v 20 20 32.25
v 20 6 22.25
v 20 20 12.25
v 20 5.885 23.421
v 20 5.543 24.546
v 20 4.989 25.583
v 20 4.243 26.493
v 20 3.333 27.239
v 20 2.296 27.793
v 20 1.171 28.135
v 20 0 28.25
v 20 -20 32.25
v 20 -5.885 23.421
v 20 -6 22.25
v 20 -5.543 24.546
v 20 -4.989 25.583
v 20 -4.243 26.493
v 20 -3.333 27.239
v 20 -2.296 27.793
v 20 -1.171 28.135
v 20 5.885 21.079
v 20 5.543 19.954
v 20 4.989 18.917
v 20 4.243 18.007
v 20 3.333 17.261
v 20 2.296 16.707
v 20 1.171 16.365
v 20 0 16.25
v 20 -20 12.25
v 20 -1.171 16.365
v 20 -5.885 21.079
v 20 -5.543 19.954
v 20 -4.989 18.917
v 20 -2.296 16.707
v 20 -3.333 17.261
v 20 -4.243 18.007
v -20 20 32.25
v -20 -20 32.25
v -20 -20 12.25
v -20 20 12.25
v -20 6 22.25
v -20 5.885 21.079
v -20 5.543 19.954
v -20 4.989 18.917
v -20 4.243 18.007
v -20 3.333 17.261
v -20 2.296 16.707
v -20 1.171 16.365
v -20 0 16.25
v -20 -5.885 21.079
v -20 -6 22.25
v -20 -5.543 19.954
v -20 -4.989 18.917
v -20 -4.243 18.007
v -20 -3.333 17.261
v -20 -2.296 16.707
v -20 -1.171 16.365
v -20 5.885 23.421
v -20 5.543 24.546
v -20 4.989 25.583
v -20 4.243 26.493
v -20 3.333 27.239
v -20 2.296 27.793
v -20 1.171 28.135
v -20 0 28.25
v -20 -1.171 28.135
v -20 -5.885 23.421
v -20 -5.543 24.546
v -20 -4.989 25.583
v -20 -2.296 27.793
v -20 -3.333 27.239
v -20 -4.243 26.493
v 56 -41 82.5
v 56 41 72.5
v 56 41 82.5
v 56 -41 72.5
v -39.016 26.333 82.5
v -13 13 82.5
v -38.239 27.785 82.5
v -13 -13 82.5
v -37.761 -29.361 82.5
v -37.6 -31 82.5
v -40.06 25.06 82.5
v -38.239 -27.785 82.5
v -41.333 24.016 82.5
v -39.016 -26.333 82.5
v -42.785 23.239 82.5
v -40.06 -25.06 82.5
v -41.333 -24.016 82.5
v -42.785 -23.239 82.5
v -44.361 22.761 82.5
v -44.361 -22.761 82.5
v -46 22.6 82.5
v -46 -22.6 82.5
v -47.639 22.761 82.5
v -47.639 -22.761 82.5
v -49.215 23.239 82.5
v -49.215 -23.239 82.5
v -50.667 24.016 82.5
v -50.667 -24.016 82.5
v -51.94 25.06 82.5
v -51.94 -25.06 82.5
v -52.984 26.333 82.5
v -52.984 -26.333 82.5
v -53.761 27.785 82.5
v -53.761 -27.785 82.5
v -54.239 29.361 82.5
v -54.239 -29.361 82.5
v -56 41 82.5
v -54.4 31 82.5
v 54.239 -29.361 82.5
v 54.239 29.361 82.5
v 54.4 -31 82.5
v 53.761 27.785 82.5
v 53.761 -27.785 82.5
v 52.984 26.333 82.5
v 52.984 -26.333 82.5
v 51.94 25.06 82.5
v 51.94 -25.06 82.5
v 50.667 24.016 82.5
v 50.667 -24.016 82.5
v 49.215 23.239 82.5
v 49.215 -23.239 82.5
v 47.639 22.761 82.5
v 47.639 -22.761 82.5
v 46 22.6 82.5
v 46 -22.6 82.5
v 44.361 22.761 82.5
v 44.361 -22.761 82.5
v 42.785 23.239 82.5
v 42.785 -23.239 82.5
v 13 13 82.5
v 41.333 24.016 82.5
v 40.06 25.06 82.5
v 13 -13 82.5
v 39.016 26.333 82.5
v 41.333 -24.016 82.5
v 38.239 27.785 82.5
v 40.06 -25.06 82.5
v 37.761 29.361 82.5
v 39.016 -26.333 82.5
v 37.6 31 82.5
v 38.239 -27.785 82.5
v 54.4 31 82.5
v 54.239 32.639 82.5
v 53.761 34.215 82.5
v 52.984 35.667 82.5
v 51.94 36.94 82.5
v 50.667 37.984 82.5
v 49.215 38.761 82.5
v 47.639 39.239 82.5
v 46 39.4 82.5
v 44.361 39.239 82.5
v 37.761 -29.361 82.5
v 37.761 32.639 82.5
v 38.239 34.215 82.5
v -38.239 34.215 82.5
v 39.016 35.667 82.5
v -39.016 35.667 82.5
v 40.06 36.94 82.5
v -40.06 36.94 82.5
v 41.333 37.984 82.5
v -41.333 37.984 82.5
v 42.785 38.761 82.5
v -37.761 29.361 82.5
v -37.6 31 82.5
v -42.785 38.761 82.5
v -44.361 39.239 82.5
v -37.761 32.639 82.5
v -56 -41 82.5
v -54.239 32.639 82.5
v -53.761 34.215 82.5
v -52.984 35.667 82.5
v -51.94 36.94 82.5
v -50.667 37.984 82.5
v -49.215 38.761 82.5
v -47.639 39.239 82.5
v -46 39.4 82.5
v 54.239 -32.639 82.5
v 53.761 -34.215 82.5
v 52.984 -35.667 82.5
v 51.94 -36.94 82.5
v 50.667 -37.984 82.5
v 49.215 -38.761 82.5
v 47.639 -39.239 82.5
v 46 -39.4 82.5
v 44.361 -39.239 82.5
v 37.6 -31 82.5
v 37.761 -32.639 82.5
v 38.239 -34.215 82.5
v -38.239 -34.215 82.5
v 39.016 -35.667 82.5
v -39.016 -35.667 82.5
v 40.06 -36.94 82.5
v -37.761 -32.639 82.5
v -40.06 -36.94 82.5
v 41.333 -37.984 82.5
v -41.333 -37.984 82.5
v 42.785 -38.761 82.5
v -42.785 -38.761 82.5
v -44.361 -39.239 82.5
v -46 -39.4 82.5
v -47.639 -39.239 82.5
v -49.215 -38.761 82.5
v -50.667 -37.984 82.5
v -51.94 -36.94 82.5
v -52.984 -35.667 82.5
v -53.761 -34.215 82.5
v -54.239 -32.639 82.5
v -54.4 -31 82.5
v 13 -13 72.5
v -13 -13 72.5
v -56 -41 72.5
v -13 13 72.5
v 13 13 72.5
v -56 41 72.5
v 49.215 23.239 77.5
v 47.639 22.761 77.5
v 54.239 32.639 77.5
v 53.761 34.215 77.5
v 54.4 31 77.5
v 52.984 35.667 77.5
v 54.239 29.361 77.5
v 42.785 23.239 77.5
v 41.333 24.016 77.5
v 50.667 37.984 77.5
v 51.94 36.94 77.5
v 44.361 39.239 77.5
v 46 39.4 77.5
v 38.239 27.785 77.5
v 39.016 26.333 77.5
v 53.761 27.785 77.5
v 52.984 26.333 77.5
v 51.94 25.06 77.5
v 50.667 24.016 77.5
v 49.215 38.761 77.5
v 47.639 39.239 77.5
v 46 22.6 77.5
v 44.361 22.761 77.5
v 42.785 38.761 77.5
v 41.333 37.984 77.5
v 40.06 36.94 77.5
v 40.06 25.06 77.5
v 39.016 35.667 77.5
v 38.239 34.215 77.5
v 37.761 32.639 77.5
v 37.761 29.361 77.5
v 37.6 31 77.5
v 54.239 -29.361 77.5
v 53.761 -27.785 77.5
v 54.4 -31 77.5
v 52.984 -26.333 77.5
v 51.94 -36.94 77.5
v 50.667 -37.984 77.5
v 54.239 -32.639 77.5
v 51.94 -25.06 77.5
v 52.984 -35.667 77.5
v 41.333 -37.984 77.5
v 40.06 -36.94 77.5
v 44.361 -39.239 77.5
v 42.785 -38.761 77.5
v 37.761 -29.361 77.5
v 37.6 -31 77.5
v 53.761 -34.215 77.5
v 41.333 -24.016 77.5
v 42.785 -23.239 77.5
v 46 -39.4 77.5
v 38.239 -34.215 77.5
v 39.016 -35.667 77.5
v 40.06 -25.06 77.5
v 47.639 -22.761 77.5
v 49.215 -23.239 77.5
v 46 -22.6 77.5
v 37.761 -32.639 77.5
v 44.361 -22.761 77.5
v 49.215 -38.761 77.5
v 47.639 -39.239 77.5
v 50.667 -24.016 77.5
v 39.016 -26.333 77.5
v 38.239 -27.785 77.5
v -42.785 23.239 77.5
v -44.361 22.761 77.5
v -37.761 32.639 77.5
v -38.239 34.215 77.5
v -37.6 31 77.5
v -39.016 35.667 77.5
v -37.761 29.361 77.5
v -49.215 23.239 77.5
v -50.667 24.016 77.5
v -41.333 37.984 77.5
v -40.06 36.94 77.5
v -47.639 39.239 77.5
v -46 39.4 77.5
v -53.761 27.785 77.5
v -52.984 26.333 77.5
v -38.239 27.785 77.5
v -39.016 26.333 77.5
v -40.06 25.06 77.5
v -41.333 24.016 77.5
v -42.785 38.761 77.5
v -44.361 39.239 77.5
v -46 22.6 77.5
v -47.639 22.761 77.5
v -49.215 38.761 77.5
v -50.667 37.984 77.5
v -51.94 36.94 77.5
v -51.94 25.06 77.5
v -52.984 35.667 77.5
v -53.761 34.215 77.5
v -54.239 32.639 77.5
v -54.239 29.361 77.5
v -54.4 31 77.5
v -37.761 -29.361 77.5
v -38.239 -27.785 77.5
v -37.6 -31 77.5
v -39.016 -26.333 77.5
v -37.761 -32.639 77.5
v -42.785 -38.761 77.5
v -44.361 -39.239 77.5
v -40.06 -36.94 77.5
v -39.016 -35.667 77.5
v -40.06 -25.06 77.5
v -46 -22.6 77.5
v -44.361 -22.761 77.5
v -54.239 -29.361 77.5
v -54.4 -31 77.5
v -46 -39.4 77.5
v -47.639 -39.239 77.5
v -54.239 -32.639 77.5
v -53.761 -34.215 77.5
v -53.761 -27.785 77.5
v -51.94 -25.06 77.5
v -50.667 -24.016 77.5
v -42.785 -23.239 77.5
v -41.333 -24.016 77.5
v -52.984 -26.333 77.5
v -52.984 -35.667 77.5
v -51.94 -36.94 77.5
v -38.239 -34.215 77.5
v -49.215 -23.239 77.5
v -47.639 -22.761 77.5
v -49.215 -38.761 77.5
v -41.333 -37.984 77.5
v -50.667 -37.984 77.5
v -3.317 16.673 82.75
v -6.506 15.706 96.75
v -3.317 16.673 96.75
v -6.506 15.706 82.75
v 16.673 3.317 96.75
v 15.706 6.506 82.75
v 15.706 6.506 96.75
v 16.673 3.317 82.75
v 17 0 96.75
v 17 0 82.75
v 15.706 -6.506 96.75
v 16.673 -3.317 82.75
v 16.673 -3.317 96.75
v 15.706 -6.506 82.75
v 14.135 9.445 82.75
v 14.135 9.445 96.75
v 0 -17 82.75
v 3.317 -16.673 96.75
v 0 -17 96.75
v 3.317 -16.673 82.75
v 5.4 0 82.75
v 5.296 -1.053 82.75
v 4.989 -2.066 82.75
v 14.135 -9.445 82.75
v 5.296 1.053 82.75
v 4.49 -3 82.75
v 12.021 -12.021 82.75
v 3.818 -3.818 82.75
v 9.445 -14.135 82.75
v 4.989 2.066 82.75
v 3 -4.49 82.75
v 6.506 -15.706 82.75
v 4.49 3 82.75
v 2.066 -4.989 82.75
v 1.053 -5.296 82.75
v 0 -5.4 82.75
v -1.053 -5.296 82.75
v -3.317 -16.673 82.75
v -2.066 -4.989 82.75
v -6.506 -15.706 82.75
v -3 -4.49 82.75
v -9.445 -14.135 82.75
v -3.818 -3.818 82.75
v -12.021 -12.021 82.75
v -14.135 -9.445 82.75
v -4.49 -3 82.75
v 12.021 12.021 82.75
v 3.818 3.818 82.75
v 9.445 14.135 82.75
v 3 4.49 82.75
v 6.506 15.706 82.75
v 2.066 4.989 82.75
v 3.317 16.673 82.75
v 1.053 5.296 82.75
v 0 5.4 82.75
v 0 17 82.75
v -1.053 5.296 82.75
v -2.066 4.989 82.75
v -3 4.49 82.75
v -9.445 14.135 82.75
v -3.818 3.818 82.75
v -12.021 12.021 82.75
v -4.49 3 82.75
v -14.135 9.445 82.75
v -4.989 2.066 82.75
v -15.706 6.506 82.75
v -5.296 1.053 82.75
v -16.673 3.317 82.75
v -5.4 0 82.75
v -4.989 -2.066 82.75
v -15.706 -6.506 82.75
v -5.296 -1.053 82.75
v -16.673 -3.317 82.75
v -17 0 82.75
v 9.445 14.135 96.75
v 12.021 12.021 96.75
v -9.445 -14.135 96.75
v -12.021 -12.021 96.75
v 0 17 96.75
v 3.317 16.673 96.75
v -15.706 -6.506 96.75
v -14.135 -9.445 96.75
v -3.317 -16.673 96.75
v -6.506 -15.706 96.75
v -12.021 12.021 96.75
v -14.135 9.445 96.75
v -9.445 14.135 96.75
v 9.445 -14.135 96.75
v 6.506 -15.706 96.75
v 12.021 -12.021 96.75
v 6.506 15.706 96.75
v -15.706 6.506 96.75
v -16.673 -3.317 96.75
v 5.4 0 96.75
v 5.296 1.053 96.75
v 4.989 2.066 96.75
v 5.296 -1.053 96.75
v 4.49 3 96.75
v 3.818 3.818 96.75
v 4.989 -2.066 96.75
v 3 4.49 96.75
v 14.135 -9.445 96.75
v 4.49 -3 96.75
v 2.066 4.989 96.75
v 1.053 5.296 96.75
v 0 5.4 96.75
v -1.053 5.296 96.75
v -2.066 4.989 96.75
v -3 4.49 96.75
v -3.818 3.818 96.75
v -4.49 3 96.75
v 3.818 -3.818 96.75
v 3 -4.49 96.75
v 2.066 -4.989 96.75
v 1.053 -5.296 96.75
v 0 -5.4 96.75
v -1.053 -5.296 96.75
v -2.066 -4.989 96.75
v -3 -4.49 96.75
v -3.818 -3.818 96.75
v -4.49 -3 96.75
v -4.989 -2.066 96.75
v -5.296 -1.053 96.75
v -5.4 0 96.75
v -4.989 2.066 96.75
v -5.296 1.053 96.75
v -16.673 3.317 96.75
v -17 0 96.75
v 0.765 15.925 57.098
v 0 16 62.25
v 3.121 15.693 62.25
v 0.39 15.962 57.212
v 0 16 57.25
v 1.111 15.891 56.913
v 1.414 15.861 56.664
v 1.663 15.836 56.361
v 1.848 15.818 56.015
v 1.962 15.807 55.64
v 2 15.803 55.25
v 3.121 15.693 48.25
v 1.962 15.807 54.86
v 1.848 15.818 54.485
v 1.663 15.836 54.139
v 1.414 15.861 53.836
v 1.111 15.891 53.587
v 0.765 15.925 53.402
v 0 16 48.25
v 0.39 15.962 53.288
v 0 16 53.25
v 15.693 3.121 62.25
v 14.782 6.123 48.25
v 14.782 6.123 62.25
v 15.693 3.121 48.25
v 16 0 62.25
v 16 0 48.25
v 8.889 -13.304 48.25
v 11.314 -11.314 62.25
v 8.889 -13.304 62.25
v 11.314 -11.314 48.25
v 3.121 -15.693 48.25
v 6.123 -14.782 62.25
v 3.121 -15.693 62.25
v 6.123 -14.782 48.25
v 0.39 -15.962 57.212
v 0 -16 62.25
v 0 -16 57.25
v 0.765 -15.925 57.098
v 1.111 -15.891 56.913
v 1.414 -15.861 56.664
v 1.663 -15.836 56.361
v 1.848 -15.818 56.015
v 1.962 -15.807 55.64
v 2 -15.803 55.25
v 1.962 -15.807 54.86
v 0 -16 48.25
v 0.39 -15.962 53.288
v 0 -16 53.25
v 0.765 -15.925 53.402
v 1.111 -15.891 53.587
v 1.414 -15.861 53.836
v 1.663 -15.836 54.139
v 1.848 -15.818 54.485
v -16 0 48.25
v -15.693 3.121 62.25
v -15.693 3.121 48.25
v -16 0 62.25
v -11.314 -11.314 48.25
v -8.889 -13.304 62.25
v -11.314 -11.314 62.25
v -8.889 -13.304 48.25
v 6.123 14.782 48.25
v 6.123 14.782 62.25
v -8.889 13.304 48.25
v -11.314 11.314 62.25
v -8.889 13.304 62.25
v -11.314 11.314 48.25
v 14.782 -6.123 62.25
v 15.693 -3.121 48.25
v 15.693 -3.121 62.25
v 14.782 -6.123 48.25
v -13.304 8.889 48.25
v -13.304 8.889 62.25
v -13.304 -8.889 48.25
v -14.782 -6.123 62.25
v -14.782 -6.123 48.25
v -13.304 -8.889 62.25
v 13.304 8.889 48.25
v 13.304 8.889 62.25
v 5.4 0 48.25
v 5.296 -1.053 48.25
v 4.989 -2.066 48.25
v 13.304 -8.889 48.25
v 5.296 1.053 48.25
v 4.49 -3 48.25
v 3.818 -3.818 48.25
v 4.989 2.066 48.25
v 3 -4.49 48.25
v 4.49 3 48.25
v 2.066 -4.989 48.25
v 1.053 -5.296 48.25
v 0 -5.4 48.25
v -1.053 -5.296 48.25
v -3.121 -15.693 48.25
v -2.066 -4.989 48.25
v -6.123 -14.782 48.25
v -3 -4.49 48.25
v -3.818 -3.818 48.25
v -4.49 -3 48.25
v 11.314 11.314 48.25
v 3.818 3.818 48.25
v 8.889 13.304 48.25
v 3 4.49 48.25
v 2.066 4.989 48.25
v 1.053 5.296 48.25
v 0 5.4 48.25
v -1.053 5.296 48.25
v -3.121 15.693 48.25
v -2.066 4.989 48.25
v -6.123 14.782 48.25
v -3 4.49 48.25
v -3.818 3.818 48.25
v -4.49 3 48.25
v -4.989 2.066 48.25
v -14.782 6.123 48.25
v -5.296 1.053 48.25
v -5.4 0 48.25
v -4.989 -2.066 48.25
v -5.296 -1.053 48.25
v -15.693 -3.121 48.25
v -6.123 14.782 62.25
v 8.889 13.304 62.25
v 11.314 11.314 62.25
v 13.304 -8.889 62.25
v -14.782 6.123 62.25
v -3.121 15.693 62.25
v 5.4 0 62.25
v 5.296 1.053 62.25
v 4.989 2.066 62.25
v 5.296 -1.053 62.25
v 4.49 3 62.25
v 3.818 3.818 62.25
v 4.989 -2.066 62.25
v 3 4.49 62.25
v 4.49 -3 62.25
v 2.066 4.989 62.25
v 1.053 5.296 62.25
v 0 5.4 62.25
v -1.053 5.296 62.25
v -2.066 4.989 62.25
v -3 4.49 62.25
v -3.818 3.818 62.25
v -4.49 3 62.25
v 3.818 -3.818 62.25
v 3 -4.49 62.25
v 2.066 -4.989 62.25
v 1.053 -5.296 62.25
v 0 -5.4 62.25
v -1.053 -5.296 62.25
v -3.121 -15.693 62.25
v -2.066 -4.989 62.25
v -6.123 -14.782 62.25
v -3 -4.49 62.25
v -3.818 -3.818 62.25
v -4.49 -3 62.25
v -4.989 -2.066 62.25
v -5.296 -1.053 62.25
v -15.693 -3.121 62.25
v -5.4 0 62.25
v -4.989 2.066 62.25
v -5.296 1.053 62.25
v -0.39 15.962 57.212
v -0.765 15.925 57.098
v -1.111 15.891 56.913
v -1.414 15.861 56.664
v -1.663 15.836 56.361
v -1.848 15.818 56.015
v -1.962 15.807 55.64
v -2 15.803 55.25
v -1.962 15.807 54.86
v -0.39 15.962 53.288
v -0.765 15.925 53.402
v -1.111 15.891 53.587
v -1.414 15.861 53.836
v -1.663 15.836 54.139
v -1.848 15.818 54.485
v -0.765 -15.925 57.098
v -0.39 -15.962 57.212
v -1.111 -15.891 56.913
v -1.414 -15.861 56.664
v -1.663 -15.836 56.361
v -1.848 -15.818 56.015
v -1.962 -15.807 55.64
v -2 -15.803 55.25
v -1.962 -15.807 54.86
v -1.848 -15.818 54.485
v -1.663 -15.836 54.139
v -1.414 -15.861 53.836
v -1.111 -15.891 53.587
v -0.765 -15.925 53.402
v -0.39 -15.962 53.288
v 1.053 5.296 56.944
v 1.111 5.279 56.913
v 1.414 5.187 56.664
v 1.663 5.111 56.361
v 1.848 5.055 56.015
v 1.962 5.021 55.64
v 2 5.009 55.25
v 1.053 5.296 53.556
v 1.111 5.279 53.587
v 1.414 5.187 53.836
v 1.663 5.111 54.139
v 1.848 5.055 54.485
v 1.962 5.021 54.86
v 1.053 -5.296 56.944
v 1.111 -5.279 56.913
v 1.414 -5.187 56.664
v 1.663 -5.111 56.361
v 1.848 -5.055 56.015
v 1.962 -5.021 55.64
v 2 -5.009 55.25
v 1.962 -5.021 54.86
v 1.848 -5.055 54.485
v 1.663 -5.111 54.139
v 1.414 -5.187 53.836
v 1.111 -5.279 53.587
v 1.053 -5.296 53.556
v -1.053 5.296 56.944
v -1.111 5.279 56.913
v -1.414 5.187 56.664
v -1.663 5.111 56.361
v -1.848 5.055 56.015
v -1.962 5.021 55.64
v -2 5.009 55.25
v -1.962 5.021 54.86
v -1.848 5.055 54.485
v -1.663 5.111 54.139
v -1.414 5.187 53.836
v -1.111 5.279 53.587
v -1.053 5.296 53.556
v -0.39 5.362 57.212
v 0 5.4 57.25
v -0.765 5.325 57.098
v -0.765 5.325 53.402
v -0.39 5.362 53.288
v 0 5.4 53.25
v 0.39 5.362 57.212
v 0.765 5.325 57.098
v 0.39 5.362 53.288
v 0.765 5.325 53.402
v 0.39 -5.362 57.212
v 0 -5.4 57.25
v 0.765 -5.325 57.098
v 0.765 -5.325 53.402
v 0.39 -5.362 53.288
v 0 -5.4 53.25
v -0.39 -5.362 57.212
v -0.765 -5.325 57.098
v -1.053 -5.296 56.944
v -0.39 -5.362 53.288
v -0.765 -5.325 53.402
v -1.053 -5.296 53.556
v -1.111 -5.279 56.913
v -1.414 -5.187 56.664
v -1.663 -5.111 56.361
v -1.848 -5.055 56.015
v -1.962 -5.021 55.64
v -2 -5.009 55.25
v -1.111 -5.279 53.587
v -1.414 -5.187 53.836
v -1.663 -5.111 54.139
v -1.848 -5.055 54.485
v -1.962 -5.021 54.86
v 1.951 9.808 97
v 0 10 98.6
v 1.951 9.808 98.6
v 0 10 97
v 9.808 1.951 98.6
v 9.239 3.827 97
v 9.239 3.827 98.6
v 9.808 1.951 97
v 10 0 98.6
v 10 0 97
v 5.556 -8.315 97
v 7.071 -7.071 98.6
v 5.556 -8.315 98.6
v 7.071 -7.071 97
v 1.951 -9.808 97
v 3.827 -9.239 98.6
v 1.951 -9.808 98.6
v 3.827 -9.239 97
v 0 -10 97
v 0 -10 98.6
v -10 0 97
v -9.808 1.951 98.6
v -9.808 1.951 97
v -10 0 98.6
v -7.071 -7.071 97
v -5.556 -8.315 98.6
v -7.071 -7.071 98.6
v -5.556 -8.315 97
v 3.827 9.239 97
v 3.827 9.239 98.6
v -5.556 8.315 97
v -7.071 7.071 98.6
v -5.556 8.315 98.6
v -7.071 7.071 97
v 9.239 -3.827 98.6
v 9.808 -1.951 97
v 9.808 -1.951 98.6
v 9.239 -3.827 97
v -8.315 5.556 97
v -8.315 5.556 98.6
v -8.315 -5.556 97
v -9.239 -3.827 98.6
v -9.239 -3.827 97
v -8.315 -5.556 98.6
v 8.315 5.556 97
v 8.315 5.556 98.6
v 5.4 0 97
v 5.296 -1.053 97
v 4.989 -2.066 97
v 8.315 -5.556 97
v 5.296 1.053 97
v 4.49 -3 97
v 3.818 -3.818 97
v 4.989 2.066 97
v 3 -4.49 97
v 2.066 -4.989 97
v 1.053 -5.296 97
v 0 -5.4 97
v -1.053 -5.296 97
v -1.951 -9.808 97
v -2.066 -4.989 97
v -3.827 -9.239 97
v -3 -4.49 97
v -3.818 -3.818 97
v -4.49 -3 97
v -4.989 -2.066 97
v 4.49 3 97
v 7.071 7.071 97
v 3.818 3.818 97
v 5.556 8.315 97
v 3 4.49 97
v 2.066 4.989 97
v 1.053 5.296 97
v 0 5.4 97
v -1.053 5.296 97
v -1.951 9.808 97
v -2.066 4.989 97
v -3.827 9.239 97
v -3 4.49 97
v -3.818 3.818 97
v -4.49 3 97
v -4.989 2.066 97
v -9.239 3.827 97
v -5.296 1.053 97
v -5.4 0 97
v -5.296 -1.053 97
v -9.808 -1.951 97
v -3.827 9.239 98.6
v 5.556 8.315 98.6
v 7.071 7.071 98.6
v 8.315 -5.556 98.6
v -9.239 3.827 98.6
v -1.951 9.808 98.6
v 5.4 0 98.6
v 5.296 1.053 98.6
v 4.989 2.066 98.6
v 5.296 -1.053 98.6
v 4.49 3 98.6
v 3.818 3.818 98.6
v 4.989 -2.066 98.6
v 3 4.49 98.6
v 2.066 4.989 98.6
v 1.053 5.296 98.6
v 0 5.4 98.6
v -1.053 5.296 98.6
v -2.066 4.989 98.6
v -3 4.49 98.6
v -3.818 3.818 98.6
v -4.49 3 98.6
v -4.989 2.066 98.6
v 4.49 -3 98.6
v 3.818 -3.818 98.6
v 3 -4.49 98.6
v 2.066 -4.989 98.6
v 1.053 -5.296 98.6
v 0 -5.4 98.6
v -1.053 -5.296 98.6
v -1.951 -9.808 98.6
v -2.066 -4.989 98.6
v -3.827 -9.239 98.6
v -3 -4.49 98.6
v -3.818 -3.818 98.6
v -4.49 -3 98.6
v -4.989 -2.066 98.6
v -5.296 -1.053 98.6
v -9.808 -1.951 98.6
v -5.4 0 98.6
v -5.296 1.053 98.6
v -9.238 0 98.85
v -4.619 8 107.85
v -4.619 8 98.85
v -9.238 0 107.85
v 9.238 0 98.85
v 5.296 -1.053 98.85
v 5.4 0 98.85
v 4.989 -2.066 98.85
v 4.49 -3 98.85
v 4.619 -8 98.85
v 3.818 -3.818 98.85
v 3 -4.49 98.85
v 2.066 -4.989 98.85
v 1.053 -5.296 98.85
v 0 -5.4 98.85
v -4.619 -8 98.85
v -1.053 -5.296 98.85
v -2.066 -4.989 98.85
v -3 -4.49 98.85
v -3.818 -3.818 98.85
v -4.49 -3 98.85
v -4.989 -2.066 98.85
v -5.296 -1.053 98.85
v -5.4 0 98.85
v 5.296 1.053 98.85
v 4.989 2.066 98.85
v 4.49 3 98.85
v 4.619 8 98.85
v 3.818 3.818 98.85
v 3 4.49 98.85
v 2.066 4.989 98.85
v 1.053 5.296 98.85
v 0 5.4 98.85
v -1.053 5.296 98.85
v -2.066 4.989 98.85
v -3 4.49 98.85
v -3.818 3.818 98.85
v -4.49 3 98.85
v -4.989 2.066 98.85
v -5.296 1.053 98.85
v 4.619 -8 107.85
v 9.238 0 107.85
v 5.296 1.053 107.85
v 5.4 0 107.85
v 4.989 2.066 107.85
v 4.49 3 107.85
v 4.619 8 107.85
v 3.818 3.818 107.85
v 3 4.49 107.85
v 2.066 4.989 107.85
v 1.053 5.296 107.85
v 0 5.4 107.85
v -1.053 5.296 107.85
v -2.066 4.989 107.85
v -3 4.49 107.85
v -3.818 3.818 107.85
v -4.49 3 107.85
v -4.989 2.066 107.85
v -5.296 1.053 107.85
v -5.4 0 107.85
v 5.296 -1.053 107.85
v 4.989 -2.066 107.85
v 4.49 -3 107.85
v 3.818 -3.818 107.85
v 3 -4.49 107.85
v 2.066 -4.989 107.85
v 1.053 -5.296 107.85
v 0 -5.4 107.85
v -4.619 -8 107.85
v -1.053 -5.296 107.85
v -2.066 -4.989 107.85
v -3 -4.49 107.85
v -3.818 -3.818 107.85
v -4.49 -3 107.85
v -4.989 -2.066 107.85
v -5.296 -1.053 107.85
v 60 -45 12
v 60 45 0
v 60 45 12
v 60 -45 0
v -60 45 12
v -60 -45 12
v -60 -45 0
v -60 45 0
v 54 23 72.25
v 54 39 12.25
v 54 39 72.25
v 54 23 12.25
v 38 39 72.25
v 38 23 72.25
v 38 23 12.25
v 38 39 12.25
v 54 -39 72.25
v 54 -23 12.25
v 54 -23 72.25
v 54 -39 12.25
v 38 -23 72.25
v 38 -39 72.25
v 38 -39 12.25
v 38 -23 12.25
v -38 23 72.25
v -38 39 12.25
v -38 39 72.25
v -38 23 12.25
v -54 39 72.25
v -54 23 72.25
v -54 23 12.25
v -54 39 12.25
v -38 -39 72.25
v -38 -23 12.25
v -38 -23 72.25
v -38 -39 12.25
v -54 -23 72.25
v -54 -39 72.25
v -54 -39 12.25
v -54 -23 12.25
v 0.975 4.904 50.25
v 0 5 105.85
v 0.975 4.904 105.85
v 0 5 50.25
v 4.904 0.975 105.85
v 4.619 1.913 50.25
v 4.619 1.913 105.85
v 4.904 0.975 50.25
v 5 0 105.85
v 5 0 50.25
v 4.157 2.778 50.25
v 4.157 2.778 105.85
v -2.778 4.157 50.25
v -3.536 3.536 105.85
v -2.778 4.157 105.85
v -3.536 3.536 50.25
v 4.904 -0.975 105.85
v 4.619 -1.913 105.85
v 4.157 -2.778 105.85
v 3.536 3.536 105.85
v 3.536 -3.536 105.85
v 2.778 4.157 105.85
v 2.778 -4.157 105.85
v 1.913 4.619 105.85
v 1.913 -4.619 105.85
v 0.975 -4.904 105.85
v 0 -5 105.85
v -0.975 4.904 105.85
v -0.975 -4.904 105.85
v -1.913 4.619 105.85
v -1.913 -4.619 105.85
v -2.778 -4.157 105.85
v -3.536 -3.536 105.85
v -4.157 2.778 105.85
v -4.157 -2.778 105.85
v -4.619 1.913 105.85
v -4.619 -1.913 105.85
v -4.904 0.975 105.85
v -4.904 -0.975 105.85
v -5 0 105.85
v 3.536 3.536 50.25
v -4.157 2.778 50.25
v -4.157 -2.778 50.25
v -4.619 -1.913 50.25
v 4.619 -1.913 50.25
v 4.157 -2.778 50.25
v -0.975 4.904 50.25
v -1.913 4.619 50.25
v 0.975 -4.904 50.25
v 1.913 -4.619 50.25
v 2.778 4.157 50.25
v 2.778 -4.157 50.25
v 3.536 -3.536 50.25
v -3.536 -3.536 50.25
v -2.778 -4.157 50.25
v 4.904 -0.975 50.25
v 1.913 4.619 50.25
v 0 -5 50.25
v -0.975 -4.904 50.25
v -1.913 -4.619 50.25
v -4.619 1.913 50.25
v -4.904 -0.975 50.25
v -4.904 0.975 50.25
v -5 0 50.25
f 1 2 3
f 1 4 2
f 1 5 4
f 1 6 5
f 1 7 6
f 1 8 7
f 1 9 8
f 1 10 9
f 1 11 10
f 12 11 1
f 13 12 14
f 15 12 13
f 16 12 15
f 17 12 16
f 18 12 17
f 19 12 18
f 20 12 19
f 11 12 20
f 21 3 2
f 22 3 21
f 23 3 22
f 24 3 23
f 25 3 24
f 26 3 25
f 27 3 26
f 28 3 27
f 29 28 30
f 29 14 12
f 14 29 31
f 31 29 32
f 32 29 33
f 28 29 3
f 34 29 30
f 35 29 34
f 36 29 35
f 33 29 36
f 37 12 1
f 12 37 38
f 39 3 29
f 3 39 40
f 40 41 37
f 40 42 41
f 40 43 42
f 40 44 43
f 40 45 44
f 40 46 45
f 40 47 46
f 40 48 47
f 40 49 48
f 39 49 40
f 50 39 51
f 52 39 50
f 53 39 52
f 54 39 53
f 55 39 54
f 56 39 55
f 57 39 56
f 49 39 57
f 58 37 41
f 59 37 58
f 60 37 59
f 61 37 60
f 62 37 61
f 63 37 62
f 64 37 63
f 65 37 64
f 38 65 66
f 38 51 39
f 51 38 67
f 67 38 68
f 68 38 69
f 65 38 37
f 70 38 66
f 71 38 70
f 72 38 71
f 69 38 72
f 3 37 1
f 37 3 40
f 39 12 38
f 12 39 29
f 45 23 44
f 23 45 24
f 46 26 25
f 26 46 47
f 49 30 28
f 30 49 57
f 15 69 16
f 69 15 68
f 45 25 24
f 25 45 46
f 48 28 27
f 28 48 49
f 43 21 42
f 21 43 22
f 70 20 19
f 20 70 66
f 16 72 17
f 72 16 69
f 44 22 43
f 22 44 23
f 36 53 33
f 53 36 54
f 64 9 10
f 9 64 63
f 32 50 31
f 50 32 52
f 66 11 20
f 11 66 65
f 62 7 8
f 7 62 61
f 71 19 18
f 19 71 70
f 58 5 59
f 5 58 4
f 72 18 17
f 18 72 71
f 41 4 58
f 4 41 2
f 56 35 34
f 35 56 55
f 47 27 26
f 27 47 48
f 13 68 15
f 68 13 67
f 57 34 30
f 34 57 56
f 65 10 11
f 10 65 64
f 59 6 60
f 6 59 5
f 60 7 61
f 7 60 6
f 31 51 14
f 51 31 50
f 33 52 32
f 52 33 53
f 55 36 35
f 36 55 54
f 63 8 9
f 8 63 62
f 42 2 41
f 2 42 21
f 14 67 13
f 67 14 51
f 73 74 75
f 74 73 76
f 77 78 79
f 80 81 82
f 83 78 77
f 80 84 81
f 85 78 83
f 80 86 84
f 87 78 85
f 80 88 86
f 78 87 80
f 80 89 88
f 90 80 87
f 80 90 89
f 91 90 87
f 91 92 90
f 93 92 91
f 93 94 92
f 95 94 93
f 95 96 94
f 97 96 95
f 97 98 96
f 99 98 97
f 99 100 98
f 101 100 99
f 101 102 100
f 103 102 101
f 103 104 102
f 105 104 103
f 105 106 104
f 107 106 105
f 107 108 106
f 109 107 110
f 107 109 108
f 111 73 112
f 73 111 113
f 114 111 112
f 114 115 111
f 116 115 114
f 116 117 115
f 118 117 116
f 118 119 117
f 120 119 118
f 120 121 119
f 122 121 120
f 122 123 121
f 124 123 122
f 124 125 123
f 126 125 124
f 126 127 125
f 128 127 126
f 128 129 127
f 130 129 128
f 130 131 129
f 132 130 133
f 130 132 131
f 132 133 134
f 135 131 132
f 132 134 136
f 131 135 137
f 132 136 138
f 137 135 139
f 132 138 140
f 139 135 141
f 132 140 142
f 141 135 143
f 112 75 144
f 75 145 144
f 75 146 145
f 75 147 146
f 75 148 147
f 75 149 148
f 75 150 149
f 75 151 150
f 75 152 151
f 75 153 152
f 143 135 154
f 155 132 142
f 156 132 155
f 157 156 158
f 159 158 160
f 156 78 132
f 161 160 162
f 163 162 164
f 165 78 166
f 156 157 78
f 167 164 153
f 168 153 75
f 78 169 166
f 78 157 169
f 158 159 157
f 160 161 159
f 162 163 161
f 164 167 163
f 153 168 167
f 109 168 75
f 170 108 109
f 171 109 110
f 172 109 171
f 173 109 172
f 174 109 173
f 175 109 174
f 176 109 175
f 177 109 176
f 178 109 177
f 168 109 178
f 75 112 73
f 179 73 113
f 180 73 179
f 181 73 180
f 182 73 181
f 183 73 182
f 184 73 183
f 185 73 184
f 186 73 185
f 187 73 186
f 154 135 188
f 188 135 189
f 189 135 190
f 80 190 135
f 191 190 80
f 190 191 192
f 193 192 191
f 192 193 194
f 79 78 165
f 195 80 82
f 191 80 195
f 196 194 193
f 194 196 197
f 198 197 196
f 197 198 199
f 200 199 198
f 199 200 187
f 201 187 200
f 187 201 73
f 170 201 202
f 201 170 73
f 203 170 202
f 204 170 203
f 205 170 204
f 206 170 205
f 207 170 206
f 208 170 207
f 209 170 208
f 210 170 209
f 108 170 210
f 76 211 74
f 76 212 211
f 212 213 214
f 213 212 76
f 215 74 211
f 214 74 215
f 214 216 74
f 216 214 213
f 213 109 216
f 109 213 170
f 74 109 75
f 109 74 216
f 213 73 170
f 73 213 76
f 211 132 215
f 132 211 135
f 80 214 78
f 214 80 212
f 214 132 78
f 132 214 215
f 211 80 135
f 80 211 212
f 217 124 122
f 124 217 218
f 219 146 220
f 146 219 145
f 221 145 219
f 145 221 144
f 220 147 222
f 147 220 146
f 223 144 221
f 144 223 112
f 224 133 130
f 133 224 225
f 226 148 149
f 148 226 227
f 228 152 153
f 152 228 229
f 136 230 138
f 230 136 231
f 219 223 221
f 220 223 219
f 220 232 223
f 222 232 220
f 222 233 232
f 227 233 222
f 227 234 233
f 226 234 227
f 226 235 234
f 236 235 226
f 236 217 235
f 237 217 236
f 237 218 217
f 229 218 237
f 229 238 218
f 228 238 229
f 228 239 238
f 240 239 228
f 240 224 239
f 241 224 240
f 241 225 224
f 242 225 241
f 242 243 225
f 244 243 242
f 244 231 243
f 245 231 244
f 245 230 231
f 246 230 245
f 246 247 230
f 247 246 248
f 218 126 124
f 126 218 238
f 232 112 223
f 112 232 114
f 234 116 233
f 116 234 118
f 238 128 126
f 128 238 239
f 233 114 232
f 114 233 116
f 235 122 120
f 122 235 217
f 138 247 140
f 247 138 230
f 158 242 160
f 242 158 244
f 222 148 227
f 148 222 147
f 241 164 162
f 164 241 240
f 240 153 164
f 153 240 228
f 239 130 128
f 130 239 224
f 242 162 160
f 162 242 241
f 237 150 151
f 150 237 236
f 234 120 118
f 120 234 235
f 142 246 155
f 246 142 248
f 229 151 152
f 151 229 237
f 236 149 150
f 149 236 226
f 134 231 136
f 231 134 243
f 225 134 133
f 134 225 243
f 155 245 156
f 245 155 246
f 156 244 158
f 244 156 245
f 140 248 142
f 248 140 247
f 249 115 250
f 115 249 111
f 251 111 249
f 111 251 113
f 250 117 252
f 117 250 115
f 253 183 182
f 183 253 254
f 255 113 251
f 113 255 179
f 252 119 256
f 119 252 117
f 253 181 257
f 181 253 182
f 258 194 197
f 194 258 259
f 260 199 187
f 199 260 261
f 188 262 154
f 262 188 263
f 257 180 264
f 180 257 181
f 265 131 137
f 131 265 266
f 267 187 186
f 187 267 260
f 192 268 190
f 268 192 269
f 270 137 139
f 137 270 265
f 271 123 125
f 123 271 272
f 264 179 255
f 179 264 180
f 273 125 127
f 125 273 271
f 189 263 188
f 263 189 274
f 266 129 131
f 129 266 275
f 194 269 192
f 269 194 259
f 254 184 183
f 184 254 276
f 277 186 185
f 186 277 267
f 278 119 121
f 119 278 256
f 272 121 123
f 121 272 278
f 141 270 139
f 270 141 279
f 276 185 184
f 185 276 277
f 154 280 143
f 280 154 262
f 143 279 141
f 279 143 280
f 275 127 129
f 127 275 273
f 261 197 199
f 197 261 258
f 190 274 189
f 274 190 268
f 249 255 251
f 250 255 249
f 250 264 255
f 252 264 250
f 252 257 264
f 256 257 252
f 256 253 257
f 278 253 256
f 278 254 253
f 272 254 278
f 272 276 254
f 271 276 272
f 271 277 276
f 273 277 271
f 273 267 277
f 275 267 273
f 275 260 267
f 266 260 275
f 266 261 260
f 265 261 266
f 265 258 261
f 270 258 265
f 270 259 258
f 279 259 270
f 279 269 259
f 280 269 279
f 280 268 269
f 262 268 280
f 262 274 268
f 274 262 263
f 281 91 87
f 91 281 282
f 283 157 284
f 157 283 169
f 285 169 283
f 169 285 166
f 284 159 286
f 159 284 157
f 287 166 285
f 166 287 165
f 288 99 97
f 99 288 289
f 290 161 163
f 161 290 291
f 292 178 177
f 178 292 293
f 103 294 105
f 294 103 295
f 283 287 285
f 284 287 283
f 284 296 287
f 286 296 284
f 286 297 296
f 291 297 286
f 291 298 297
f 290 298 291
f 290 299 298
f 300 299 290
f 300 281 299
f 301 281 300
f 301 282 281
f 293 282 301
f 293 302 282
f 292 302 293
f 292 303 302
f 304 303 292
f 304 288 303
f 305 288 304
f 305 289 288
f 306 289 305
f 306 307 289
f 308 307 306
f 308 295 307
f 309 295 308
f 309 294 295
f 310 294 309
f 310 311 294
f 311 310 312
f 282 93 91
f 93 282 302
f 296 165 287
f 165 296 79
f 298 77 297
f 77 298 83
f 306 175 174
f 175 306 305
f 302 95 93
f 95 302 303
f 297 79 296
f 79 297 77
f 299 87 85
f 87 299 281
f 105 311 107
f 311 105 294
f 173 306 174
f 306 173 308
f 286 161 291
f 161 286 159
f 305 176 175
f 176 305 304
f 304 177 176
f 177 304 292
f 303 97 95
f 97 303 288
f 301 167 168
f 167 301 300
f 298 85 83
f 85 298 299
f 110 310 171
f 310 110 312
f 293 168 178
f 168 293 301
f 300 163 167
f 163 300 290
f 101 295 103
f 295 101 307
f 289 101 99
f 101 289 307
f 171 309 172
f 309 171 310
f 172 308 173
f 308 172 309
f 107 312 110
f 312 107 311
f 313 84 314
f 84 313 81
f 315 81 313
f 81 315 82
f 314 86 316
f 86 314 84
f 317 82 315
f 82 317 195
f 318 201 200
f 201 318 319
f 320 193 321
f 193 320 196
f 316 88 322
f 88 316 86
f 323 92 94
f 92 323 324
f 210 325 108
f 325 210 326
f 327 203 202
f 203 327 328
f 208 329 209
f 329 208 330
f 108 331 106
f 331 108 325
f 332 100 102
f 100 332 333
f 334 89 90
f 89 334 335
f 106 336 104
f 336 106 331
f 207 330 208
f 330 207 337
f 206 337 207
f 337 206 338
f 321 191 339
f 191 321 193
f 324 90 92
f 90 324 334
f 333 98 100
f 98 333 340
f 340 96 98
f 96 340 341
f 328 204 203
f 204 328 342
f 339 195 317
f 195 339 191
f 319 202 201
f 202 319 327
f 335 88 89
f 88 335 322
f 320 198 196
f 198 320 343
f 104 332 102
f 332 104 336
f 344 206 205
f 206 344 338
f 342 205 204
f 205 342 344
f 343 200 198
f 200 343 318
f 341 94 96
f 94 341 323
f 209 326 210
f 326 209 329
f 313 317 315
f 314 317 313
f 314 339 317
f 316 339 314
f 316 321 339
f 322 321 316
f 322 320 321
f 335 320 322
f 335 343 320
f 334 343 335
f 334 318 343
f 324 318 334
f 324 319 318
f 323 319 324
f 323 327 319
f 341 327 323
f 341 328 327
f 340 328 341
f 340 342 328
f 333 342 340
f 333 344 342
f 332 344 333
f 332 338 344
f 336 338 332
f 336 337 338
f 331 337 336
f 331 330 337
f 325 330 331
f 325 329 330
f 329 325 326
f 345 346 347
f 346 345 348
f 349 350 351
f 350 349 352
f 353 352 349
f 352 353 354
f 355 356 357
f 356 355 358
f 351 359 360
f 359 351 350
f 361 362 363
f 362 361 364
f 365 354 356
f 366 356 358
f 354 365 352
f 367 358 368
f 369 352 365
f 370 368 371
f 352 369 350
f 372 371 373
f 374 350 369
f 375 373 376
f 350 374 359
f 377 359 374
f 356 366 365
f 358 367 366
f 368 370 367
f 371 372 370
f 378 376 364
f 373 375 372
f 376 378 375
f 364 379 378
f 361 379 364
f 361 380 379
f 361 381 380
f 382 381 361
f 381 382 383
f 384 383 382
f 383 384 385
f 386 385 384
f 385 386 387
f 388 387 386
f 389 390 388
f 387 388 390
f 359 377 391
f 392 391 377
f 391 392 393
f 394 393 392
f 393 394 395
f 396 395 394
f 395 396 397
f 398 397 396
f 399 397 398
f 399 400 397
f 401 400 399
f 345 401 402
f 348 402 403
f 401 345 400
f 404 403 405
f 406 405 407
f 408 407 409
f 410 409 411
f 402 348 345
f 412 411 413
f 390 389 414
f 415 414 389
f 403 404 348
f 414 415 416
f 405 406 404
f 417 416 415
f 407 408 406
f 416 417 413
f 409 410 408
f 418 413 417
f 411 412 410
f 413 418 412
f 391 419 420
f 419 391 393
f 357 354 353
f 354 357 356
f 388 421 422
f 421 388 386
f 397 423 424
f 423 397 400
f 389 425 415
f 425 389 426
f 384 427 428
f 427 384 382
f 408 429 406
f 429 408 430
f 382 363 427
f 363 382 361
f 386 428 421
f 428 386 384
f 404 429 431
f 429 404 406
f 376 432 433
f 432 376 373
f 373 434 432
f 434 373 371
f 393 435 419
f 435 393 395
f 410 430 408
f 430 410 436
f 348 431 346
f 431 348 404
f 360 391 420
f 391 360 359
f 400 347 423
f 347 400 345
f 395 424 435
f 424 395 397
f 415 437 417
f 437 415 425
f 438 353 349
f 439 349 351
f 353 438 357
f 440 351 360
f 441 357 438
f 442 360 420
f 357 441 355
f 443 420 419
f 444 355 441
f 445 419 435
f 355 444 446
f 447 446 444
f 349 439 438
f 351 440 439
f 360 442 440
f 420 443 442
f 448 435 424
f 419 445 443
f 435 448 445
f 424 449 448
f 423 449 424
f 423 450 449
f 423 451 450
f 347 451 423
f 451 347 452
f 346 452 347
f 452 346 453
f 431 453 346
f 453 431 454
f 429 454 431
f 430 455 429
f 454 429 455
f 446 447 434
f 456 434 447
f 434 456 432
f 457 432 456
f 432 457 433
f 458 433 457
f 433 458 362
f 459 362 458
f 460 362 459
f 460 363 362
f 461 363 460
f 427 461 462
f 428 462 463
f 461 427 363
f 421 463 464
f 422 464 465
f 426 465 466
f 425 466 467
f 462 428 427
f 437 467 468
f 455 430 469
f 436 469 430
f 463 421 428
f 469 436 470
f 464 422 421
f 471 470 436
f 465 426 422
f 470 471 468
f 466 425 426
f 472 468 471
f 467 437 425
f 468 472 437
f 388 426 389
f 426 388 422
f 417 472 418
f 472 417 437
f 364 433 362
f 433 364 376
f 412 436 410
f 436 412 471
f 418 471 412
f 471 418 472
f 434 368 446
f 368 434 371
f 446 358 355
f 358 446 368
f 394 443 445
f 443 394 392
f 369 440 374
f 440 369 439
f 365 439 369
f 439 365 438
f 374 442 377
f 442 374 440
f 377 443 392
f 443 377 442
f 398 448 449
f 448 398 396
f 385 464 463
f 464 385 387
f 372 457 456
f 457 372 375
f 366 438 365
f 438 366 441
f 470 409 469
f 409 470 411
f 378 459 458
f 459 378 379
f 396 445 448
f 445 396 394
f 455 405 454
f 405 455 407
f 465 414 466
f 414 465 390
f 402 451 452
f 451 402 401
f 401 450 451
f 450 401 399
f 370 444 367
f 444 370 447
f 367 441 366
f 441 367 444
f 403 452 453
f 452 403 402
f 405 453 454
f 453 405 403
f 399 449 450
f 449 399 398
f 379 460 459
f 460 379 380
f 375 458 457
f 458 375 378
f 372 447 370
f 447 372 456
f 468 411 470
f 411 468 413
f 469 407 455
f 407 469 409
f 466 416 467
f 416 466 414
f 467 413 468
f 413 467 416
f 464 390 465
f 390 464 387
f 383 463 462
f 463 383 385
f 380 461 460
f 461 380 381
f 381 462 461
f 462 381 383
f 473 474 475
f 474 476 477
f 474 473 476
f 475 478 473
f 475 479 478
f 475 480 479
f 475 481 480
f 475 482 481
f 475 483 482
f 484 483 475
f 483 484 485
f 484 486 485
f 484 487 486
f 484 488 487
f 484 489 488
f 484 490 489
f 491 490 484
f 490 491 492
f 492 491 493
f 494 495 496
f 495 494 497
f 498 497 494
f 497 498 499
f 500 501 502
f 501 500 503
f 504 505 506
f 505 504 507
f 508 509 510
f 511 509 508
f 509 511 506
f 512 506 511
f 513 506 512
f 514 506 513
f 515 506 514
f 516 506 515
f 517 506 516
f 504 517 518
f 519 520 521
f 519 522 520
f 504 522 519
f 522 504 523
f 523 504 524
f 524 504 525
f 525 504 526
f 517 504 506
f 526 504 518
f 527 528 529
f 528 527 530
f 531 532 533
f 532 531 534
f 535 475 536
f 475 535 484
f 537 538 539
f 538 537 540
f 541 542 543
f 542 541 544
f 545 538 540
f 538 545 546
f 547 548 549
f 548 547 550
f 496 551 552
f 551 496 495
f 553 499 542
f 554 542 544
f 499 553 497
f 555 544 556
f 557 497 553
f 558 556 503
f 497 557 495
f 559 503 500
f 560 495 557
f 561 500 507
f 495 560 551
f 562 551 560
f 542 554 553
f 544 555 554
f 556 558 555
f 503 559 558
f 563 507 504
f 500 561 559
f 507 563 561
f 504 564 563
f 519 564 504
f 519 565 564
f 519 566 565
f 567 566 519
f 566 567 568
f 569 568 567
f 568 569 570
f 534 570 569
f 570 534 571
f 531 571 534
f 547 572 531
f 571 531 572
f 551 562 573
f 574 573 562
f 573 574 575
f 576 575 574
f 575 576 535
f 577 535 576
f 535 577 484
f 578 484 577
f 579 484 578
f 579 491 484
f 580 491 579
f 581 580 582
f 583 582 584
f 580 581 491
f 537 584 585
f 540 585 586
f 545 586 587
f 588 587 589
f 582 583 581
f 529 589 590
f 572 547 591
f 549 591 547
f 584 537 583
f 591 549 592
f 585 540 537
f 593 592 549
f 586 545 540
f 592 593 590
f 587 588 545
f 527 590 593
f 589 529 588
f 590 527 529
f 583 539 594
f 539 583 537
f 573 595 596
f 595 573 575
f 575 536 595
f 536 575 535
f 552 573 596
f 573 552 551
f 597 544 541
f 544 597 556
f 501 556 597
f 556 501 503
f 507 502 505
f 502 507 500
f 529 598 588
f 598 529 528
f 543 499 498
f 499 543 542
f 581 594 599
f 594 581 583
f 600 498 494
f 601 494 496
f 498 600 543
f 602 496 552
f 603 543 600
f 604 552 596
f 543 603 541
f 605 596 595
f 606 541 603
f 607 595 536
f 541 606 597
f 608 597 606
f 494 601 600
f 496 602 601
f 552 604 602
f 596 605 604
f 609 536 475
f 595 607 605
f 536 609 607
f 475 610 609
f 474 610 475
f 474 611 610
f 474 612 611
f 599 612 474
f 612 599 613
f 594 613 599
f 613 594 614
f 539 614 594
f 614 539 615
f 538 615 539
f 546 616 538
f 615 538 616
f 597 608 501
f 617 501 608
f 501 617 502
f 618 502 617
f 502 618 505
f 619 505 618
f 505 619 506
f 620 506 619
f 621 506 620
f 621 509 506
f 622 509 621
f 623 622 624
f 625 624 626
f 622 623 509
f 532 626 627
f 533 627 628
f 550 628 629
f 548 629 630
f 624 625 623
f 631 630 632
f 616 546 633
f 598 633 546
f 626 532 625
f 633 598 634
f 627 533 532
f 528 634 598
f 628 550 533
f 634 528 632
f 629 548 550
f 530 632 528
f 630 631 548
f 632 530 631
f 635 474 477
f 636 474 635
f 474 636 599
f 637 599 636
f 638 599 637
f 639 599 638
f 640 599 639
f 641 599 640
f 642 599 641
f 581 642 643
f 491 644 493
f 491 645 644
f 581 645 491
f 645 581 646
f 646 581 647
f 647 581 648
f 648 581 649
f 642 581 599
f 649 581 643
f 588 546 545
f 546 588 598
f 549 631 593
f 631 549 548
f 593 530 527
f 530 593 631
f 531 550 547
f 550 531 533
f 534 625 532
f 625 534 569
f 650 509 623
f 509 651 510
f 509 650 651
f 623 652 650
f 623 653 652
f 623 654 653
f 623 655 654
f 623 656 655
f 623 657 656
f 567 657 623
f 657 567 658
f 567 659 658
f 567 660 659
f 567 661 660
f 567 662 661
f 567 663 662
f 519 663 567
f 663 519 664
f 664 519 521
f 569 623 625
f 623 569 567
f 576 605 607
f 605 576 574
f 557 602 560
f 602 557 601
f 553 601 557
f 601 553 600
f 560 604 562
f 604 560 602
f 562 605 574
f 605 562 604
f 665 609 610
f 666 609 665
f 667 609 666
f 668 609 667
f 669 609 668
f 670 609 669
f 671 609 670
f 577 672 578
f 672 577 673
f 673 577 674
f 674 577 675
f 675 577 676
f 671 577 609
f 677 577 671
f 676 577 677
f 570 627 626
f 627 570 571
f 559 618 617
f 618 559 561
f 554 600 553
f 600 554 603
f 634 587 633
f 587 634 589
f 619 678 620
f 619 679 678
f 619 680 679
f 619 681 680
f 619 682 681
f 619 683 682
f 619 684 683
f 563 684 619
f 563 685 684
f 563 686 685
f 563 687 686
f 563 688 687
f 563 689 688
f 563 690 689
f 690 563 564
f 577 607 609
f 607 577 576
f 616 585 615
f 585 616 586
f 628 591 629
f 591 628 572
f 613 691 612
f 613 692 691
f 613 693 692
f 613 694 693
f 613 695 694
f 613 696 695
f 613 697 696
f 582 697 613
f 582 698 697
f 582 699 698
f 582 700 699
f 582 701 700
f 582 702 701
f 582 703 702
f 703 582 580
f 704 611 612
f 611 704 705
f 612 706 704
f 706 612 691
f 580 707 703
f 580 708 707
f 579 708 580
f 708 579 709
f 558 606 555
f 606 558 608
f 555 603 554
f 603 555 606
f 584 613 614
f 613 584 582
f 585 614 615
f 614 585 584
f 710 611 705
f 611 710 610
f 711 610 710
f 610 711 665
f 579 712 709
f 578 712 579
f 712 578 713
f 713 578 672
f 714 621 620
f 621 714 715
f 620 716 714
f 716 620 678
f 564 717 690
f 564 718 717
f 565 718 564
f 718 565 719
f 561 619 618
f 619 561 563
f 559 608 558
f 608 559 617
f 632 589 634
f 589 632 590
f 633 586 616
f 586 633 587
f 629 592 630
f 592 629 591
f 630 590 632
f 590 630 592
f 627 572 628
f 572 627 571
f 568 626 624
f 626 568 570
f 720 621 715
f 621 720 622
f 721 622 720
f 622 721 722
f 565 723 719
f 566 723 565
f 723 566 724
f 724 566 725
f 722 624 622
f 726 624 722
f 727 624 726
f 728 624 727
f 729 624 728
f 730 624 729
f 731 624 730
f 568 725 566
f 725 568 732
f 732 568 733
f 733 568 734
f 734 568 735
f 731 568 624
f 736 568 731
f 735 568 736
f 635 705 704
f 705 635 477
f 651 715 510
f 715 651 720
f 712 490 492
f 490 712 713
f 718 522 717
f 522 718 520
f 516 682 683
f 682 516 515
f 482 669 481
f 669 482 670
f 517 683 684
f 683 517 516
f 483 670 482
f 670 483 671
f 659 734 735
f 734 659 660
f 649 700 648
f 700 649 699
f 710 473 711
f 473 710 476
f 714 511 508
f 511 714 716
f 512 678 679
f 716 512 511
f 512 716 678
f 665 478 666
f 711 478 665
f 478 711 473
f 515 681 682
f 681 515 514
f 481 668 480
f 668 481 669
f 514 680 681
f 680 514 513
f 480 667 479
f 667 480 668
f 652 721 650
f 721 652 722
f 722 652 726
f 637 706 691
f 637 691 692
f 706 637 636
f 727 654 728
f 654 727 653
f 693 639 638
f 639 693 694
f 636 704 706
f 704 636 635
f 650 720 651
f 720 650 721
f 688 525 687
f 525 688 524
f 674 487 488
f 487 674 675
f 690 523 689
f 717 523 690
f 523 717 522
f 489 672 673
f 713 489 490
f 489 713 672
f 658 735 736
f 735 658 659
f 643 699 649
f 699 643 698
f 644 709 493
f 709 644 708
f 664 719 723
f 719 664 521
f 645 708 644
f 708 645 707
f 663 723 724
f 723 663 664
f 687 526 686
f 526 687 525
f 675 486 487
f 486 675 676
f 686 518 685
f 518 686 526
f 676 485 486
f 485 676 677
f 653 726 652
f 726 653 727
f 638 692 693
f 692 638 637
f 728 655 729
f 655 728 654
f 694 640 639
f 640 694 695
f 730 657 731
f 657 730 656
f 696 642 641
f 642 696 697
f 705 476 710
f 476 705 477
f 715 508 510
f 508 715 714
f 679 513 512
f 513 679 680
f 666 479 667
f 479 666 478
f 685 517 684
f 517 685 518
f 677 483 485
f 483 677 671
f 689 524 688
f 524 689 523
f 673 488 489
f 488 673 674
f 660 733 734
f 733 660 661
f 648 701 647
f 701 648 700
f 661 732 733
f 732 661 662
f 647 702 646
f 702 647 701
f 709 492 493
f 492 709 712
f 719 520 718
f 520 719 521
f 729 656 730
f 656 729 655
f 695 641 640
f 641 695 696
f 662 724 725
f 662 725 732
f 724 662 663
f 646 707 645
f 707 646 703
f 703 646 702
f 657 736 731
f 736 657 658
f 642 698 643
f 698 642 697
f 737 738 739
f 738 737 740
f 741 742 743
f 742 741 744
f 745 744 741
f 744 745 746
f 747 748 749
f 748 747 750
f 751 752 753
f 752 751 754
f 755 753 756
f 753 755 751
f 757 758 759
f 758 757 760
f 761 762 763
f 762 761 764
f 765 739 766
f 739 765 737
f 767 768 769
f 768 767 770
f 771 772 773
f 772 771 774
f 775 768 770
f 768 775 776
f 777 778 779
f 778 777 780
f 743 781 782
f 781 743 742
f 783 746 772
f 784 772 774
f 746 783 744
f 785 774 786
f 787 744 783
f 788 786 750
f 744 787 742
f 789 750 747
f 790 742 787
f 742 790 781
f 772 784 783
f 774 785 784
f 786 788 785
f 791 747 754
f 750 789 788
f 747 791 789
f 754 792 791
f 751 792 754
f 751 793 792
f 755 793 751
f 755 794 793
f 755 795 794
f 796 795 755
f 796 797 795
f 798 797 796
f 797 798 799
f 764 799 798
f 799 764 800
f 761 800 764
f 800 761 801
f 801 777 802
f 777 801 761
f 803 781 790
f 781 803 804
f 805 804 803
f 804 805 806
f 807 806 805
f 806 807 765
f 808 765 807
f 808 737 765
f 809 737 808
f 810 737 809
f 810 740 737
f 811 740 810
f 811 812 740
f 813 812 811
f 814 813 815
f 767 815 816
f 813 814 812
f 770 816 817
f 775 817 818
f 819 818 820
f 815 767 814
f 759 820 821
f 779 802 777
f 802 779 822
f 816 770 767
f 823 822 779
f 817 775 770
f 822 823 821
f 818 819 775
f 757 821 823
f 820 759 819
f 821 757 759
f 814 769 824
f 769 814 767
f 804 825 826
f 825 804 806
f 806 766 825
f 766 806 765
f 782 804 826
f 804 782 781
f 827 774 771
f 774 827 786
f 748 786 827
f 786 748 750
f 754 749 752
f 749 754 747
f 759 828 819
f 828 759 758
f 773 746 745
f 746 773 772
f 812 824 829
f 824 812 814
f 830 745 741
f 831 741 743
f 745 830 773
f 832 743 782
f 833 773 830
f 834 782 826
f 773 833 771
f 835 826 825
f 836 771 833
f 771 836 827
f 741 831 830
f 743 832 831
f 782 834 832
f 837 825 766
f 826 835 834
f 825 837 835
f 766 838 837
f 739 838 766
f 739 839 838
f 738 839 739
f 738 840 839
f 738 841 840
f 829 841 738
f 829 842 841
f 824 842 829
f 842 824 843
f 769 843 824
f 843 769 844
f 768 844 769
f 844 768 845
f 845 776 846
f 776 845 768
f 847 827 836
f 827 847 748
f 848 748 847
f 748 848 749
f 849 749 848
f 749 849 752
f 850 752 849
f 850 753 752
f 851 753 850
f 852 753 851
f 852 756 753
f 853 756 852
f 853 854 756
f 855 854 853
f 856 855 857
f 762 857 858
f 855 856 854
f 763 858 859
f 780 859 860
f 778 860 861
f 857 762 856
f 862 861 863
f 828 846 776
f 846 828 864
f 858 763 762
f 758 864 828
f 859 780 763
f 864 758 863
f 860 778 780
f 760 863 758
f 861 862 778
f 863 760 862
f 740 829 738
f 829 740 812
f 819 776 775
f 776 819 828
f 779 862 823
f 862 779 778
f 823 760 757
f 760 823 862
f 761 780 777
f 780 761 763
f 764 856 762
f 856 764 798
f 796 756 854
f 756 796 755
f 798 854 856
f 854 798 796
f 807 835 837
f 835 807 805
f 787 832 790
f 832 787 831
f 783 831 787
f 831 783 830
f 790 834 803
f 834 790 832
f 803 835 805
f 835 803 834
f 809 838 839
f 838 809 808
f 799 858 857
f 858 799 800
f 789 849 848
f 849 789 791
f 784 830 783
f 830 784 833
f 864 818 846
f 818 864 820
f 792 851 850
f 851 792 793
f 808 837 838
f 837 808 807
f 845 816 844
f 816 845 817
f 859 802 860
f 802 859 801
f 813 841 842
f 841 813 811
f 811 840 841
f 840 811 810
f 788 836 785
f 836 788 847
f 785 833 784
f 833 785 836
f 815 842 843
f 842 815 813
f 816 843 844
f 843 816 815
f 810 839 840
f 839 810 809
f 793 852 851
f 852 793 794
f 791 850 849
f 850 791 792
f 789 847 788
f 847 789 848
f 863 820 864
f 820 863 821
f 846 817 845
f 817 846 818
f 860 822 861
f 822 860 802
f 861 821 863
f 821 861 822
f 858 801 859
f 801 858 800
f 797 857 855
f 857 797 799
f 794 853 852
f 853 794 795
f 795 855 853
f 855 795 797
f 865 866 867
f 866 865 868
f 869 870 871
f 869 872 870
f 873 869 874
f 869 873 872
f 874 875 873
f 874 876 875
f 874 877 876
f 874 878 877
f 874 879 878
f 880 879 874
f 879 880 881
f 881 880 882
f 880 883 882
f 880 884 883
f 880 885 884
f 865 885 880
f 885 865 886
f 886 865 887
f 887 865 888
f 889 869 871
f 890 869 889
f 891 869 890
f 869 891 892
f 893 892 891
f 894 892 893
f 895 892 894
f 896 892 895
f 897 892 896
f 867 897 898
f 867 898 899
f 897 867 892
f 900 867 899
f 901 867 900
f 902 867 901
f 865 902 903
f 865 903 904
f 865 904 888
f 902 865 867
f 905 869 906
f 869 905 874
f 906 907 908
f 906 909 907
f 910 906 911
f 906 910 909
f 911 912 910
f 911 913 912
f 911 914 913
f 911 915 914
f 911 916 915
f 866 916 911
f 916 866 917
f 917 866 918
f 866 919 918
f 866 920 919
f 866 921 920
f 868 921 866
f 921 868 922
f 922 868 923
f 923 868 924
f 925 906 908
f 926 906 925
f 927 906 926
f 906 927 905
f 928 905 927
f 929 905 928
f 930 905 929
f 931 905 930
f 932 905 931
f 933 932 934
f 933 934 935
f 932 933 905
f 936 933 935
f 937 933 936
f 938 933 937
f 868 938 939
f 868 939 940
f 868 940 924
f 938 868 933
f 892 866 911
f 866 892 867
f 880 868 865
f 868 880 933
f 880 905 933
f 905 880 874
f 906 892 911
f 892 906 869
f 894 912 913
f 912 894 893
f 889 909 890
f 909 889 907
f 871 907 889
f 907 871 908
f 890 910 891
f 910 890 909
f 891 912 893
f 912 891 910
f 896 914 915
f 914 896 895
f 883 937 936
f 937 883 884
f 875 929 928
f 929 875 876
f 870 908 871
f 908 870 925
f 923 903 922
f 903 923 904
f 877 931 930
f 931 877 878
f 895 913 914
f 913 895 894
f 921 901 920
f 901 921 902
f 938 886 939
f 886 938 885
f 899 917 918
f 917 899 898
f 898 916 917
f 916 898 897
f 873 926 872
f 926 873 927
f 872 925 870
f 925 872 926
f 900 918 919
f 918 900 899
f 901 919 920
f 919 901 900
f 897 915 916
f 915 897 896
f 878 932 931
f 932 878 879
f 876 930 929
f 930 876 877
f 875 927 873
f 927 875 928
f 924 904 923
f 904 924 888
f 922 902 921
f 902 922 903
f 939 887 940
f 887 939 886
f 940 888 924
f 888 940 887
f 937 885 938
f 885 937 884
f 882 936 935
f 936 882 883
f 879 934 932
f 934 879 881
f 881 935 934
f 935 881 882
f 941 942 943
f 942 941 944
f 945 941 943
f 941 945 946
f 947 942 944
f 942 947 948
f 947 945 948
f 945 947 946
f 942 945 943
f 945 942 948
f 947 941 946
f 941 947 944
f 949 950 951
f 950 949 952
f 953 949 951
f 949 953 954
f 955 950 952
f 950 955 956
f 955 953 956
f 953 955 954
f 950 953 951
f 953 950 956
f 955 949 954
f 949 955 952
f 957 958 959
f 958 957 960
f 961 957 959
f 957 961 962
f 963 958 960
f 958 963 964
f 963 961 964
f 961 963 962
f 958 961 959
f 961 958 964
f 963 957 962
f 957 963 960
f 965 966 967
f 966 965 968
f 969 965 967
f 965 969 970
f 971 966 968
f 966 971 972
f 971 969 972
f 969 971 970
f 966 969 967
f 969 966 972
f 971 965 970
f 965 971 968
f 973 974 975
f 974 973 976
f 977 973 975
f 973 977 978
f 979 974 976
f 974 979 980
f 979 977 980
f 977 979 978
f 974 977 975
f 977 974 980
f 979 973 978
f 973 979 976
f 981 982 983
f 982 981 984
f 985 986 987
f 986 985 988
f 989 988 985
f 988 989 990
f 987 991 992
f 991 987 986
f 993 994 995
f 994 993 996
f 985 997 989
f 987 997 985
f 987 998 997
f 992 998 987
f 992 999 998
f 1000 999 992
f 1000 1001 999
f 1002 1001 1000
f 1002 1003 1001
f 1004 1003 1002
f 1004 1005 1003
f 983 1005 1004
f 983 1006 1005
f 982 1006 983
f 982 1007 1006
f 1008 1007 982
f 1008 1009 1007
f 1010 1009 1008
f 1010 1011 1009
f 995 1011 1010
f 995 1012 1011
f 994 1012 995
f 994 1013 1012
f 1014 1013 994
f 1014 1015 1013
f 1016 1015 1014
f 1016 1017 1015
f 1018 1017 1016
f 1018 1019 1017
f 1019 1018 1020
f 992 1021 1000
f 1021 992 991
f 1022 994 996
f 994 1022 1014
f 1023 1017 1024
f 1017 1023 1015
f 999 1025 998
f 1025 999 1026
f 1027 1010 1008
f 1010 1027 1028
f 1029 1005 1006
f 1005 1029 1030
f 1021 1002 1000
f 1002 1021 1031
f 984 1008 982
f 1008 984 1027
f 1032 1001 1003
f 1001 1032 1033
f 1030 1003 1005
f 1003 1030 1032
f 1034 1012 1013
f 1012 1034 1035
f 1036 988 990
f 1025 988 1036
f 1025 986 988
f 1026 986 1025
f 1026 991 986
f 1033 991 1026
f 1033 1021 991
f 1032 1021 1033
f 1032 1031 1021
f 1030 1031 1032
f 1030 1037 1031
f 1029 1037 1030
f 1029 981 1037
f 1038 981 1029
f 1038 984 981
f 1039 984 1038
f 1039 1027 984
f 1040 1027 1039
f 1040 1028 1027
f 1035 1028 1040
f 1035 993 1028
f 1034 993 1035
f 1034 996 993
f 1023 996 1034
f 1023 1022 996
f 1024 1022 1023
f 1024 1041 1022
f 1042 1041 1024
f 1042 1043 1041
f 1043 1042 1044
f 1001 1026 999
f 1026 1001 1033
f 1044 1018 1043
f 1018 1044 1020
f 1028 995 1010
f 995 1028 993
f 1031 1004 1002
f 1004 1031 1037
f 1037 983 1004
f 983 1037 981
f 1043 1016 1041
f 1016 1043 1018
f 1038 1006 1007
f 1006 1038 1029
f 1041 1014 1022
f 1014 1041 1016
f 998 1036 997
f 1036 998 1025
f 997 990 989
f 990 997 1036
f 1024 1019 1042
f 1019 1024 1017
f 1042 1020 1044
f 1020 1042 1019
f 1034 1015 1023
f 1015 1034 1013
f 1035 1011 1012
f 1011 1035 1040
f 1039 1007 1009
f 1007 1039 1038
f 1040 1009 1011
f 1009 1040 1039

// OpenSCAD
$fn = 32;

// ------------------------------------------------------------------------
// Arbor press fixture: screw d10, posts 60 mm, gap 16 mm
// Every part is its own module, assembly() places every instance.
// ------------------------------------------------------------------------

// --- part 1 ---
module press_bed() {
  difference() {
    translate([-60, -45, 0]) cube([120, 90, 12]);
  }
}

// --- part 2 ---
module anvil_block() {
  difference() {
    translate([-20, -20, 0]) cube([40, 40, 20]);
    translate([0, 0, 10]) rotate([0, 90, 0]) cylinder(h = 42, d = 12, center = true);
  }
}

// --- part 3 ---
module press_post_a() {
  translate([-8, -8, 0]) cube([16, 16, 60]);
}

// --- part 4 ---
module press_post_b() {
  translate([-8, -8, 0]) cube([16, 16, 60]);
}

// --- part 5 ---
module press_post_c() {
  translate([-8, -8, 0]) cube([16, 16, 60]);
}

// --- part 6 ---
module press_post_d() {
  translate([-8, -8, 0]) cube([16, 16, 60]);
}

// --- part 7 ---
module press_frame() {
  difference() {
    translate([-56, -41, 0]) cube([112, 82, 10]);
    translate([-13, -13, -1]) cube([26, 26, 12]);
    translate([46, 31, 5]) cylinder(h = 6, d = 16.8);
    translate([46, -31, 5]) cylinder(h = 6, d = 16.8);
    translate([-46, 31, 5]) cylinder(h = 6, d = 16.8);
    translate([-46, -31, 5]) cylinder(h = 6, d = 16.8);
  }
}

// --- part 8 ---
module guide_ring() {
  difference() {
      translate([0, 0, 0]) cylinder(h = 14, d = 34);
      translate([0, 0, -1]) cylinder(h = 16, d = 10.8);
    }
}

// --- part 9 ---
module press_screw() {
  translate([0, 0, -27.8]) cylinder(h = 55.6, d = 10);
}

// --- part 10 ---
module press_head() {
  difference() {
    cylinder(h = 14, d = 32);
    translate([0, 0, -1]) cylinder(h = 16, d = 10.8);
    translate([0, 0, 7]) rotate([90, 0, 0]) cylinder(h = 34, d = 4, center = true);
  }
}

// --- part 11 ---
module nut_washer() {
  difference() {
      translate([0, 0, 0]) cylinder(h = 1.6, d = 20);
      translate([0, 0, -1]) cylinder(h = 3.6, d = 10.8);
    }
}

// --- part 12 ---
module press_nut() {
  difference() {
    linear_extrude(height = 9) polygon(points = [[9.238, 0], [4.619, 8], [-4.619, 8], [-9.238, 0], [-4.619, -8], [4.619, -8]]);
    translate([0, 0, -1]) cylinder(h = 11, d = 10.8);
  }
}

// --- assembly ---
module assembly() {
  color([0.80, 0.24, 0.20]) translate([0, 0, 0]) rotate([0, 0, 0]) press_bed();
  color([0.20, 0.45, 0.75]) translate([0, 0, 12.25]) rotate([0, 0, 0]) anvil_block();
  color([0.25, 0.62, 0.32]) translate([46, 31, 12.25]) rotate([0, 0, 0]) press_post_a();
  color([0.92, 0.70, 0.18]) translate([46, -31, 12.25]) rotate([0, 0, 0]) press_post_b();
  color([0.58, 0.35, 0.70]) translate([-46, 31, 12.25]) rotate([0, 0, 0]) press_post_c();
  color([0.16, 0.66, 0.66]) translate([-46, -31, 12.25]) rotate([0, 0, 0]) press_post_d();
  color([0.85, 0.48, 0.18]) translate([0, 0, 72.5]) rotate([0, 0, 0]) press_frame();
  color([0.55, 0.60, 0.65]) translate([0, 0, 82.75]) rotate([0, 0, 0]) guide_ring();
  color([0.75, 0.30, 0.55]) translate([0, 0, 78.05]) rotate([0, 0, 0]) press_screw();
  color([0.42, 0.52, 0.28]) translate([0, 0, 48.25]) rotate([0, 0, 0]) press_head();
  color([0.80, 0.24, 0.20]) translate([0, 0, 97]) rotate([0, 0, 0]) nut_washer();
  color([0.20, 0.45, 0.75]) translate([0, 0, 98.85]) rotate([0, 0, 0]) press_nut();
}

assembly();
